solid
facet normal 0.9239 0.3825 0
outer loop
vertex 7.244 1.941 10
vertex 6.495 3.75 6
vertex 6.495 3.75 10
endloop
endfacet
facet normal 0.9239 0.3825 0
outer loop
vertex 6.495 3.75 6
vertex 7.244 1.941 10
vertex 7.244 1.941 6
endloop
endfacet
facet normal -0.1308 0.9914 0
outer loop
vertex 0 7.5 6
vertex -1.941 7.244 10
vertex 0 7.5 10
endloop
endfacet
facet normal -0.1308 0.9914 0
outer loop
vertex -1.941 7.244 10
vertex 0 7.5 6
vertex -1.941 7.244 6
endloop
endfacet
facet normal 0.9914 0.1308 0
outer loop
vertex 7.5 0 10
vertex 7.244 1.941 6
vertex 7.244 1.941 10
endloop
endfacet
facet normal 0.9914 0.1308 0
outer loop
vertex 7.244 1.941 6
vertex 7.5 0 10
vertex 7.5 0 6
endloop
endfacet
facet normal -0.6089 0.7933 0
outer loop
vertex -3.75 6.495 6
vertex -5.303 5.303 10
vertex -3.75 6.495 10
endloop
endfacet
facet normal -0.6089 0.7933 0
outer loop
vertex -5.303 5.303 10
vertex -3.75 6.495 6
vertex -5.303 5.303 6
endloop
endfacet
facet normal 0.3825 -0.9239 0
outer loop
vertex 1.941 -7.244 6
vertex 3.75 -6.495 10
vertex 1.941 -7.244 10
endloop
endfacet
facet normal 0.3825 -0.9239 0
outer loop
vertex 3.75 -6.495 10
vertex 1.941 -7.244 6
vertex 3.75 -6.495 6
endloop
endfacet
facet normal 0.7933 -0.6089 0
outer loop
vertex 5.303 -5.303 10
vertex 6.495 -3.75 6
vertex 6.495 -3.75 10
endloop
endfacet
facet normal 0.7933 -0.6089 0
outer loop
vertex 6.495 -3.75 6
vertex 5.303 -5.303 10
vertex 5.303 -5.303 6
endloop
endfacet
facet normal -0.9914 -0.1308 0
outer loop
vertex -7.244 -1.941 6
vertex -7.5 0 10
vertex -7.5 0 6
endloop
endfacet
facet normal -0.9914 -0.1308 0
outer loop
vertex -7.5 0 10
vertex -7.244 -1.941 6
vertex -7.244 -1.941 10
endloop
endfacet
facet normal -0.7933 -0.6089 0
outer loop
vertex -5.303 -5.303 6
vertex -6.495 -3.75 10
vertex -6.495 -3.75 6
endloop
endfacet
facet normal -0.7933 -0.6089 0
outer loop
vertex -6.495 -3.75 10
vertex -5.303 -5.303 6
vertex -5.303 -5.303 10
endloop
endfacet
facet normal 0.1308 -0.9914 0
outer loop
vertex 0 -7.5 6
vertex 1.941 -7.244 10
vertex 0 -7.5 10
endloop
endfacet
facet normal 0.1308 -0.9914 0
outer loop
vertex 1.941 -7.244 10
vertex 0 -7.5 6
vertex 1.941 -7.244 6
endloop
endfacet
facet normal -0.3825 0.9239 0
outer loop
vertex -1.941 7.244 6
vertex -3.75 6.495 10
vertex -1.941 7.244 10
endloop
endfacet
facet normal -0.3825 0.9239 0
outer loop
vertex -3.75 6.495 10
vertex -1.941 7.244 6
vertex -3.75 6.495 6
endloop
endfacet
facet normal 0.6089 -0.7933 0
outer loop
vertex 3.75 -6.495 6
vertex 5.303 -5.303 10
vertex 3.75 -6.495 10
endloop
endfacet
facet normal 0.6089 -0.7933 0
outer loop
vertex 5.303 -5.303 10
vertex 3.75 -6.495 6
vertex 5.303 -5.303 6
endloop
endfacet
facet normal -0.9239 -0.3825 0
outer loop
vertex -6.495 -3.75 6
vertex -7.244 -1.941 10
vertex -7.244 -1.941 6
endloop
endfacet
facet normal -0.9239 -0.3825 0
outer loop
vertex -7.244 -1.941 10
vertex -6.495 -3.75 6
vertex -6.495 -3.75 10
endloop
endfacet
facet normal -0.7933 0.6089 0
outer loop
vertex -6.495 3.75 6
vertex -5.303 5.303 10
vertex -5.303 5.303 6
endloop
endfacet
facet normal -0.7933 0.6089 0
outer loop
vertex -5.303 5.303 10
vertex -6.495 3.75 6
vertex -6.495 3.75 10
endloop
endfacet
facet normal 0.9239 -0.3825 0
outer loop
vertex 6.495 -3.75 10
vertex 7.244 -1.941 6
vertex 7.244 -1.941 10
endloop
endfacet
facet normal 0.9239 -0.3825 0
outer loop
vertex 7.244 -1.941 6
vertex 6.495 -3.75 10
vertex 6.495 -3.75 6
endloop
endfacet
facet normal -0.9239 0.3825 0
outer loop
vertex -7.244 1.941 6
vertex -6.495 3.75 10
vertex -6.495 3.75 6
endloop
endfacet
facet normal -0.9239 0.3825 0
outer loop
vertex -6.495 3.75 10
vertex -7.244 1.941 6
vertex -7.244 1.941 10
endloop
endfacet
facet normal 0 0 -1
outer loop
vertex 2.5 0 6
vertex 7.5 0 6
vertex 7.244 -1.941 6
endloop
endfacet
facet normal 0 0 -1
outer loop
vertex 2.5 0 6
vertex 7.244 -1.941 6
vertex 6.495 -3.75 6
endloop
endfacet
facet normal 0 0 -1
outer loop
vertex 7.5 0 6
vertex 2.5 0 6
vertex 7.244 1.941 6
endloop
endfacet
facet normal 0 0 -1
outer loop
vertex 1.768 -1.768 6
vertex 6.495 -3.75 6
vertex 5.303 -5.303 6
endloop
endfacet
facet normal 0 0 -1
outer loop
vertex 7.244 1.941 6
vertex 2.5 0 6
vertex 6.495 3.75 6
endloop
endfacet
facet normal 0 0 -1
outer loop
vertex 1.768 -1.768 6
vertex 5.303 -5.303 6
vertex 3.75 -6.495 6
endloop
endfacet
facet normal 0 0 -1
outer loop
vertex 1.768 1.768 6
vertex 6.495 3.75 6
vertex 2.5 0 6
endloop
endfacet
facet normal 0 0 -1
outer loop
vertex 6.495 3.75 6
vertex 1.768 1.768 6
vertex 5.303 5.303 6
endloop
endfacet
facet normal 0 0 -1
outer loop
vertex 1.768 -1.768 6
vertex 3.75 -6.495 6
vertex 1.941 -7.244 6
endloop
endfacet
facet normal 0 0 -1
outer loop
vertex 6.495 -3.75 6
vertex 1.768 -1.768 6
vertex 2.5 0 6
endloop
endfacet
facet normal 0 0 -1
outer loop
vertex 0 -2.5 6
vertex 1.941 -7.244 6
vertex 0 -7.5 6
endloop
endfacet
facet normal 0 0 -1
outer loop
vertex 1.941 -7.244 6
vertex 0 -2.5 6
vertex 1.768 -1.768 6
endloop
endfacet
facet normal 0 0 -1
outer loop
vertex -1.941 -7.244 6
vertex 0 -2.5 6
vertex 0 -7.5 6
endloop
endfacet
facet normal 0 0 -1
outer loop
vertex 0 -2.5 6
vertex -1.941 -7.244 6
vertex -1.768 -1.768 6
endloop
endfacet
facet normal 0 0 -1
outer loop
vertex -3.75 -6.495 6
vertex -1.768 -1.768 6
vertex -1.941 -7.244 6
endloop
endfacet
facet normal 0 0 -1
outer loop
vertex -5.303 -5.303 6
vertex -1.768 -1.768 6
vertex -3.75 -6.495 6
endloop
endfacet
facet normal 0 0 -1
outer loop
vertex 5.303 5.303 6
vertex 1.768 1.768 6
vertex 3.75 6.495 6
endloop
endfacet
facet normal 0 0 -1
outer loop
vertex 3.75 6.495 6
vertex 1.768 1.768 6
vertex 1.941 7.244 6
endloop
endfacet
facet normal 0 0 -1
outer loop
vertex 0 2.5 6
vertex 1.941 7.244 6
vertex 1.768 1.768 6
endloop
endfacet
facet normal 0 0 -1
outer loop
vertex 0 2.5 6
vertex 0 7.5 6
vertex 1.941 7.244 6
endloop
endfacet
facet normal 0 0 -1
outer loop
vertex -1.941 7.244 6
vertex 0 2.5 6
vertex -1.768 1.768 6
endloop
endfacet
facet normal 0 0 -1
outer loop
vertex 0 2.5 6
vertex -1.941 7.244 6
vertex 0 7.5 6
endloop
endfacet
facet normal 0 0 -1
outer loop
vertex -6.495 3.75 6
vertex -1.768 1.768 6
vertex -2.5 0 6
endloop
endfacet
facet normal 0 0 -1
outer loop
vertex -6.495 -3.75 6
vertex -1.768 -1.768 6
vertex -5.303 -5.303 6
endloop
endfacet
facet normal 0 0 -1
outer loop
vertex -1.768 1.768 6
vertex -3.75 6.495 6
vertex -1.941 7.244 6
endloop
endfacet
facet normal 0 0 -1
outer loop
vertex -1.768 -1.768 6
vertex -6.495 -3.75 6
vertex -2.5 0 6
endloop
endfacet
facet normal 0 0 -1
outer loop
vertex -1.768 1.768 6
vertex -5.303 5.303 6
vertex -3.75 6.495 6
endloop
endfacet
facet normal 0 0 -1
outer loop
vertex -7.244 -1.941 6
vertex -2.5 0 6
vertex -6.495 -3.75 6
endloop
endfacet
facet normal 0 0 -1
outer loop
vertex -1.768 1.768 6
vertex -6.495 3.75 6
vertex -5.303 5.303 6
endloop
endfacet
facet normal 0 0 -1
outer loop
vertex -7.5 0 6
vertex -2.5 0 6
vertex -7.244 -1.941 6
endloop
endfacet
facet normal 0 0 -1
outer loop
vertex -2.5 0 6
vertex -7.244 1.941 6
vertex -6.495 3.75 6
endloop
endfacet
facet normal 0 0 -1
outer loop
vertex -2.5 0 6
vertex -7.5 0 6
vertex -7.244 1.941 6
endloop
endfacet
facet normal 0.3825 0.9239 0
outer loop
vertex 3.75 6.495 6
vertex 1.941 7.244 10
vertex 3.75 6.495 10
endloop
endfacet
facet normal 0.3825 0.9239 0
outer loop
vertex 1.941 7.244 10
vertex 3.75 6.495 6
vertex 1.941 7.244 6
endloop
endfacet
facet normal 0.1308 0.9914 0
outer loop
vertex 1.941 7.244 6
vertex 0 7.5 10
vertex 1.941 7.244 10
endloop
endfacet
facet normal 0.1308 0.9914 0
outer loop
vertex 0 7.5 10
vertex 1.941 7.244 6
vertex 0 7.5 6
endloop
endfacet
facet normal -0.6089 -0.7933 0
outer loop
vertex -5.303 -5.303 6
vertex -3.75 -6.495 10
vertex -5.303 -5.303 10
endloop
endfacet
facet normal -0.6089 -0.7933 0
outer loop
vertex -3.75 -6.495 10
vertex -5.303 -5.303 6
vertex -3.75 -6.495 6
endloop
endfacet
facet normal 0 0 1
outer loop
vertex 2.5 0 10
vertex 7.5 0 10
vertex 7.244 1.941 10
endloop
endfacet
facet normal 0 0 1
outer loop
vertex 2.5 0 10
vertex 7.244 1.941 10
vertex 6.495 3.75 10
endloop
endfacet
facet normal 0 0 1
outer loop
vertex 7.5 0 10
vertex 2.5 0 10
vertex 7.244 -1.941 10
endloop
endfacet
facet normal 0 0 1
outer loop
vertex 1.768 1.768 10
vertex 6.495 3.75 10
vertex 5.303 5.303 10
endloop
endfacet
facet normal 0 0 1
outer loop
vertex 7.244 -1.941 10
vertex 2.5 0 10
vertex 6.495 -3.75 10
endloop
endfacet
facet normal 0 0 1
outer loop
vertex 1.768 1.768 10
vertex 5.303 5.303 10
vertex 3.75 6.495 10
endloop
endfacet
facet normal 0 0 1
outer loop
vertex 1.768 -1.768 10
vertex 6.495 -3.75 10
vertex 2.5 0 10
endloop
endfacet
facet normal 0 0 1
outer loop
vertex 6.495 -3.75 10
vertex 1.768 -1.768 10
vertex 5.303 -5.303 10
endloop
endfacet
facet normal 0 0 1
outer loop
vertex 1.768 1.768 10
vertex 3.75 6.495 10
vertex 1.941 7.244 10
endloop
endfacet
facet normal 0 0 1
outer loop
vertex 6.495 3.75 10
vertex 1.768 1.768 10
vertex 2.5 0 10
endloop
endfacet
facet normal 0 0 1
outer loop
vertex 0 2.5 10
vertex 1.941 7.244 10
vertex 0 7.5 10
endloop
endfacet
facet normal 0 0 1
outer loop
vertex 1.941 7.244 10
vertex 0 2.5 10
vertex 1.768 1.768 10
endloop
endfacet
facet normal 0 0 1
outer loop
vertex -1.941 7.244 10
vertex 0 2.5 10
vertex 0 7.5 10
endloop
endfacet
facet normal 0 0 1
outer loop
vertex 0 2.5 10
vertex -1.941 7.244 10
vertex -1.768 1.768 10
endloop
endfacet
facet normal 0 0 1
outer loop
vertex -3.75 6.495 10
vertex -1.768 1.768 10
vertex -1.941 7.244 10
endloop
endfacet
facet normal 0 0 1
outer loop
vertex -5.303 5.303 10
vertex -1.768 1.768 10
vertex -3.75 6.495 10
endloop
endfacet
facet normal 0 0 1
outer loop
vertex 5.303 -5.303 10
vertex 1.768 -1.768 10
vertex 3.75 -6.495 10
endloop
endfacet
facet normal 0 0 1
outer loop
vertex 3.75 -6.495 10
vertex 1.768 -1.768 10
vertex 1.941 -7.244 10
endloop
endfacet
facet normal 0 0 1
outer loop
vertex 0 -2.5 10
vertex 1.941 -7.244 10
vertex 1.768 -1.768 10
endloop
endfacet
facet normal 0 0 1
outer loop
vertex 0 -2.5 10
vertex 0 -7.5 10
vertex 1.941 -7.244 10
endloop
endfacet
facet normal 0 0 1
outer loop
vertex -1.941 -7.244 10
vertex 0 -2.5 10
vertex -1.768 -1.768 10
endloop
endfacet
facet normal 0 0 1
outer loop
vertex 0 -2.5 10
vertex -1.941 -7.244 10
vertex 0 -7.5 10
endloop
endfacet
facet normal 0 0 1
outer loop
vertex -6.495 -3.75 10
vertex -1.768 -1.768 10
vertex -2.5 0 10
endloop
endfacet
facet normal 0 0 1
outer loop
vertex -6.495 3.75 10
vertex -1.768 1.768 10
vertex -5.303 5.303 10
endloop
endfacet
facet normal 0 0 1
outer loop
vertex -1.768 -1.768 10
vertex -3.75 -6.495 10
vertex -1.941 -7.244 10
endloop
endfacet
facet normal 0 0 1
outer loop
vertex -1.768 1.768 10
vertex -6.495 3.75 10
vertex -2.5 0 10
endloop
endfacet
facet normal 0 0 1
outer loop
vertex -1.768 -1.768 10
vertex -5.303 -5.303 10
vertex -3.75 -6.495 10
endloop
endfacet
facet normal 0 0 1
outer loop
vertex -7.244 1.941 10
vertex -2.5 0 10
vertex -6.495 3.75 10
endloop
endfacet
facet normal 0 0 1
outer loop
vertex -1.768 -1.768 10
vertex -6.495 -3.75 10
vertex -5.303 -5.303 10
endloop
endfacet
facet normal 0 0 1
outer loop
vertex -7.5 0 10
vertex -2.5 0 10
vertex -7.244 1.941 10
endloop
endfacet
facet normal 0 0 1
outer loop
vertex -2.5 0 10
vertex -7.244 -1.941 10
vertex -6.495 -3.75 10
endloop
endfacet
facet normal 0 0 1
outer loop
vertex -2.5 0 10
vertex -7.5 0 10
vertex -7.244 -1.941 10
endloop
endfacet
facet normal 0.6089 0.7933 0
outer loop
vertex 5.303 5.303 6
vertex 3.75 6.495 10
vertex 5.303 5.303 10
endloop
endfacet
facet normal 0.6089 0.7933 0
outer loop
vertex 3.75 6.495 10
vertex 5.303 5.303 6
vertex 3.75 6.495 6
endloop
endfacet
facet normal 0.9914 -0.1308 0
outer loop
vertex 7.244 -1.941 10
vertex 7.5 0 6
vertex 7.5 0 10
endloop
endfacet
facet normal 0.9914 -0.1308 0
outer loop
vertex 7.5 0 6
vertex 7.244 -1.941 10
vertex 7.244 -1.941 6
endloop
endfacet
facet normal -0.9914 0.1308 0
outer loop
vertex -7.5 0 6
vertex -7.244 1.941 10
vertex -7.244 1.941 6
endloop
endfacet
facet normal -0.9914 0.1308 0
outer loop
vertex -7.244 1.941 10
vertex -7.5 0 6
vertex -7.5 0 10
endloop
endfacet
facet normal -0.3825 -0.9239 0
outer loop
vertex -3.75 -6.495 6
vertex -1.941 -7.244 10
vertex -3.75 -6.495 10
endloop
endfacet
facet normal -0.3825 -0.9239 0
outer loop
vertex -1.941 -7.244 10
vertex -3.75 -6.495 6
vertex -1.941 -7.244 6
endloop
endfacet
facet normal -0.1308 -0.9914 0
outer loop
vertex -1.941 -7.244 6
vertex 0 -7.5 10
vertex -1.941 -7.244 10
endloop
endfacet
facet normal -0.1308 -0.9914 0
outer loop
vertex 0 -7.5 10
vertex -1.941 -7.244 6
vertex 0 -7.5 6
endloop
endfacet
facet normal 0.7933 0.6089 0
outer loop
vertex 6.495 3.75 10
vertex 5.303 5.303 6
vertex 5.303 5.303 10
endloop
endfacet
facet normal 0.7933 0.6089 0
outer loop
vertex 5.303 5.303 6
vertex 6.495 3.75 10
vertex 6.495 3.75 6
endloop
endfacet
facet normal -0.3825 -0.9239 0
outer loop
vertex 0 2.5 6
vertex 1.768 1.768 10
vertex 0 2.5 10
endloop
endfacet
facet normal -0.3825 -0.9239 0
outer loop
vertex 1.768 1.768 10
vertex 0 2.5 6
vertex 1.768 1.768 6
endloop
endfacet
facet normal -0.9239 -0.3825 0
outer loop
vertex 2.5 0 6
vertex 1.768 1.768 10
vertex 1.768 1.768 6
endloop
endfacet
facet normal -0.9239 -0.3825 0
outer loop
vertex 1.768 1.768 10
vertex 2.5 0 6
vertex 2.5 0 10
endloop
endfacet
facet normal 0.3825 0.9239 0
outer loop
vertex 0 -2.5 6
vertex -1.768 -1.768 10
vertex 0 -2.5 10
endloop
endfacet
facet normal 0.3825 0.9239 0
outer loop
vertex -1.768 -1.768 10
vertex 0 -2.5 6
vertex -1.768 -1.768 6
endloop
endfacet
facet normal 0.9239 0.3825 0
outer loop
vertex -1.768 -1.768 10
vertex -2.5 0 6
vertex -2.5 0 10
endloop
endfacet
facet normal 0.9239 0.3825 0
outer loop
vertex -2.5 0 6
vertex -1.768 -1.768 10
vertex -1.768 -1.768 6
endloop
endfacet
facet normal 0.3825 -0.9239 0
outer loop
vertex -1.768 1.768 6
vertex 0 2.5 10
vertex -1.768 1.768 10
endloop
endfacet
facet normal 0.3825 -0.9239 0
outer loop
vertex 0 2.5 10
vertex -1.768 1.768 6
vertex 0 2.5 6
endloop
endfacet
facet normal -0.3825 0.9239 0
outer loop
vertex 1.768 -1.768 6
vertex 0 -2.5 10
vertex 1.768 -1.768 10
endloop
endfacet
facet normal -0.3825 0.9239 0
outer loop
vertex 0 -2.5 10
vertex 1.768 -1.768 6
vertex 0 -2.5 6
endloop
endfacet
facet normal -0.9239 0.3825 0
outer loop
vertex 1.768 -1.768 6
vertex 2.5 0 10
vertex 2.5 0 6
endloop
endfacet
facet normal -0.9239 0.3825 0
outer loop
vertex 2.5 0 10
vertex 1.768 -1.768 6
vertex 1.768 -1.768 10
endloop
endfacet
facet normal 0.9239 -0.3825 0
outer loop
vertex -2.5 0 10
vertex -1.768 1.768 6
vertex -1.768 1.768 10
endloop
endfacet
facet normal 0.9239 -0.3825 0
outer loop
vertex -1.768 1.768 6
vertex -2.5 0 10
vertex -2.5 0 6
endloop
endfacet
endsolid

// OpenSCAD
use <MCAD/involute_gears.scad>
gear(number_of_teeth=12, circular_pitch=8, gear_thickness=6, bore_diameter=5);
